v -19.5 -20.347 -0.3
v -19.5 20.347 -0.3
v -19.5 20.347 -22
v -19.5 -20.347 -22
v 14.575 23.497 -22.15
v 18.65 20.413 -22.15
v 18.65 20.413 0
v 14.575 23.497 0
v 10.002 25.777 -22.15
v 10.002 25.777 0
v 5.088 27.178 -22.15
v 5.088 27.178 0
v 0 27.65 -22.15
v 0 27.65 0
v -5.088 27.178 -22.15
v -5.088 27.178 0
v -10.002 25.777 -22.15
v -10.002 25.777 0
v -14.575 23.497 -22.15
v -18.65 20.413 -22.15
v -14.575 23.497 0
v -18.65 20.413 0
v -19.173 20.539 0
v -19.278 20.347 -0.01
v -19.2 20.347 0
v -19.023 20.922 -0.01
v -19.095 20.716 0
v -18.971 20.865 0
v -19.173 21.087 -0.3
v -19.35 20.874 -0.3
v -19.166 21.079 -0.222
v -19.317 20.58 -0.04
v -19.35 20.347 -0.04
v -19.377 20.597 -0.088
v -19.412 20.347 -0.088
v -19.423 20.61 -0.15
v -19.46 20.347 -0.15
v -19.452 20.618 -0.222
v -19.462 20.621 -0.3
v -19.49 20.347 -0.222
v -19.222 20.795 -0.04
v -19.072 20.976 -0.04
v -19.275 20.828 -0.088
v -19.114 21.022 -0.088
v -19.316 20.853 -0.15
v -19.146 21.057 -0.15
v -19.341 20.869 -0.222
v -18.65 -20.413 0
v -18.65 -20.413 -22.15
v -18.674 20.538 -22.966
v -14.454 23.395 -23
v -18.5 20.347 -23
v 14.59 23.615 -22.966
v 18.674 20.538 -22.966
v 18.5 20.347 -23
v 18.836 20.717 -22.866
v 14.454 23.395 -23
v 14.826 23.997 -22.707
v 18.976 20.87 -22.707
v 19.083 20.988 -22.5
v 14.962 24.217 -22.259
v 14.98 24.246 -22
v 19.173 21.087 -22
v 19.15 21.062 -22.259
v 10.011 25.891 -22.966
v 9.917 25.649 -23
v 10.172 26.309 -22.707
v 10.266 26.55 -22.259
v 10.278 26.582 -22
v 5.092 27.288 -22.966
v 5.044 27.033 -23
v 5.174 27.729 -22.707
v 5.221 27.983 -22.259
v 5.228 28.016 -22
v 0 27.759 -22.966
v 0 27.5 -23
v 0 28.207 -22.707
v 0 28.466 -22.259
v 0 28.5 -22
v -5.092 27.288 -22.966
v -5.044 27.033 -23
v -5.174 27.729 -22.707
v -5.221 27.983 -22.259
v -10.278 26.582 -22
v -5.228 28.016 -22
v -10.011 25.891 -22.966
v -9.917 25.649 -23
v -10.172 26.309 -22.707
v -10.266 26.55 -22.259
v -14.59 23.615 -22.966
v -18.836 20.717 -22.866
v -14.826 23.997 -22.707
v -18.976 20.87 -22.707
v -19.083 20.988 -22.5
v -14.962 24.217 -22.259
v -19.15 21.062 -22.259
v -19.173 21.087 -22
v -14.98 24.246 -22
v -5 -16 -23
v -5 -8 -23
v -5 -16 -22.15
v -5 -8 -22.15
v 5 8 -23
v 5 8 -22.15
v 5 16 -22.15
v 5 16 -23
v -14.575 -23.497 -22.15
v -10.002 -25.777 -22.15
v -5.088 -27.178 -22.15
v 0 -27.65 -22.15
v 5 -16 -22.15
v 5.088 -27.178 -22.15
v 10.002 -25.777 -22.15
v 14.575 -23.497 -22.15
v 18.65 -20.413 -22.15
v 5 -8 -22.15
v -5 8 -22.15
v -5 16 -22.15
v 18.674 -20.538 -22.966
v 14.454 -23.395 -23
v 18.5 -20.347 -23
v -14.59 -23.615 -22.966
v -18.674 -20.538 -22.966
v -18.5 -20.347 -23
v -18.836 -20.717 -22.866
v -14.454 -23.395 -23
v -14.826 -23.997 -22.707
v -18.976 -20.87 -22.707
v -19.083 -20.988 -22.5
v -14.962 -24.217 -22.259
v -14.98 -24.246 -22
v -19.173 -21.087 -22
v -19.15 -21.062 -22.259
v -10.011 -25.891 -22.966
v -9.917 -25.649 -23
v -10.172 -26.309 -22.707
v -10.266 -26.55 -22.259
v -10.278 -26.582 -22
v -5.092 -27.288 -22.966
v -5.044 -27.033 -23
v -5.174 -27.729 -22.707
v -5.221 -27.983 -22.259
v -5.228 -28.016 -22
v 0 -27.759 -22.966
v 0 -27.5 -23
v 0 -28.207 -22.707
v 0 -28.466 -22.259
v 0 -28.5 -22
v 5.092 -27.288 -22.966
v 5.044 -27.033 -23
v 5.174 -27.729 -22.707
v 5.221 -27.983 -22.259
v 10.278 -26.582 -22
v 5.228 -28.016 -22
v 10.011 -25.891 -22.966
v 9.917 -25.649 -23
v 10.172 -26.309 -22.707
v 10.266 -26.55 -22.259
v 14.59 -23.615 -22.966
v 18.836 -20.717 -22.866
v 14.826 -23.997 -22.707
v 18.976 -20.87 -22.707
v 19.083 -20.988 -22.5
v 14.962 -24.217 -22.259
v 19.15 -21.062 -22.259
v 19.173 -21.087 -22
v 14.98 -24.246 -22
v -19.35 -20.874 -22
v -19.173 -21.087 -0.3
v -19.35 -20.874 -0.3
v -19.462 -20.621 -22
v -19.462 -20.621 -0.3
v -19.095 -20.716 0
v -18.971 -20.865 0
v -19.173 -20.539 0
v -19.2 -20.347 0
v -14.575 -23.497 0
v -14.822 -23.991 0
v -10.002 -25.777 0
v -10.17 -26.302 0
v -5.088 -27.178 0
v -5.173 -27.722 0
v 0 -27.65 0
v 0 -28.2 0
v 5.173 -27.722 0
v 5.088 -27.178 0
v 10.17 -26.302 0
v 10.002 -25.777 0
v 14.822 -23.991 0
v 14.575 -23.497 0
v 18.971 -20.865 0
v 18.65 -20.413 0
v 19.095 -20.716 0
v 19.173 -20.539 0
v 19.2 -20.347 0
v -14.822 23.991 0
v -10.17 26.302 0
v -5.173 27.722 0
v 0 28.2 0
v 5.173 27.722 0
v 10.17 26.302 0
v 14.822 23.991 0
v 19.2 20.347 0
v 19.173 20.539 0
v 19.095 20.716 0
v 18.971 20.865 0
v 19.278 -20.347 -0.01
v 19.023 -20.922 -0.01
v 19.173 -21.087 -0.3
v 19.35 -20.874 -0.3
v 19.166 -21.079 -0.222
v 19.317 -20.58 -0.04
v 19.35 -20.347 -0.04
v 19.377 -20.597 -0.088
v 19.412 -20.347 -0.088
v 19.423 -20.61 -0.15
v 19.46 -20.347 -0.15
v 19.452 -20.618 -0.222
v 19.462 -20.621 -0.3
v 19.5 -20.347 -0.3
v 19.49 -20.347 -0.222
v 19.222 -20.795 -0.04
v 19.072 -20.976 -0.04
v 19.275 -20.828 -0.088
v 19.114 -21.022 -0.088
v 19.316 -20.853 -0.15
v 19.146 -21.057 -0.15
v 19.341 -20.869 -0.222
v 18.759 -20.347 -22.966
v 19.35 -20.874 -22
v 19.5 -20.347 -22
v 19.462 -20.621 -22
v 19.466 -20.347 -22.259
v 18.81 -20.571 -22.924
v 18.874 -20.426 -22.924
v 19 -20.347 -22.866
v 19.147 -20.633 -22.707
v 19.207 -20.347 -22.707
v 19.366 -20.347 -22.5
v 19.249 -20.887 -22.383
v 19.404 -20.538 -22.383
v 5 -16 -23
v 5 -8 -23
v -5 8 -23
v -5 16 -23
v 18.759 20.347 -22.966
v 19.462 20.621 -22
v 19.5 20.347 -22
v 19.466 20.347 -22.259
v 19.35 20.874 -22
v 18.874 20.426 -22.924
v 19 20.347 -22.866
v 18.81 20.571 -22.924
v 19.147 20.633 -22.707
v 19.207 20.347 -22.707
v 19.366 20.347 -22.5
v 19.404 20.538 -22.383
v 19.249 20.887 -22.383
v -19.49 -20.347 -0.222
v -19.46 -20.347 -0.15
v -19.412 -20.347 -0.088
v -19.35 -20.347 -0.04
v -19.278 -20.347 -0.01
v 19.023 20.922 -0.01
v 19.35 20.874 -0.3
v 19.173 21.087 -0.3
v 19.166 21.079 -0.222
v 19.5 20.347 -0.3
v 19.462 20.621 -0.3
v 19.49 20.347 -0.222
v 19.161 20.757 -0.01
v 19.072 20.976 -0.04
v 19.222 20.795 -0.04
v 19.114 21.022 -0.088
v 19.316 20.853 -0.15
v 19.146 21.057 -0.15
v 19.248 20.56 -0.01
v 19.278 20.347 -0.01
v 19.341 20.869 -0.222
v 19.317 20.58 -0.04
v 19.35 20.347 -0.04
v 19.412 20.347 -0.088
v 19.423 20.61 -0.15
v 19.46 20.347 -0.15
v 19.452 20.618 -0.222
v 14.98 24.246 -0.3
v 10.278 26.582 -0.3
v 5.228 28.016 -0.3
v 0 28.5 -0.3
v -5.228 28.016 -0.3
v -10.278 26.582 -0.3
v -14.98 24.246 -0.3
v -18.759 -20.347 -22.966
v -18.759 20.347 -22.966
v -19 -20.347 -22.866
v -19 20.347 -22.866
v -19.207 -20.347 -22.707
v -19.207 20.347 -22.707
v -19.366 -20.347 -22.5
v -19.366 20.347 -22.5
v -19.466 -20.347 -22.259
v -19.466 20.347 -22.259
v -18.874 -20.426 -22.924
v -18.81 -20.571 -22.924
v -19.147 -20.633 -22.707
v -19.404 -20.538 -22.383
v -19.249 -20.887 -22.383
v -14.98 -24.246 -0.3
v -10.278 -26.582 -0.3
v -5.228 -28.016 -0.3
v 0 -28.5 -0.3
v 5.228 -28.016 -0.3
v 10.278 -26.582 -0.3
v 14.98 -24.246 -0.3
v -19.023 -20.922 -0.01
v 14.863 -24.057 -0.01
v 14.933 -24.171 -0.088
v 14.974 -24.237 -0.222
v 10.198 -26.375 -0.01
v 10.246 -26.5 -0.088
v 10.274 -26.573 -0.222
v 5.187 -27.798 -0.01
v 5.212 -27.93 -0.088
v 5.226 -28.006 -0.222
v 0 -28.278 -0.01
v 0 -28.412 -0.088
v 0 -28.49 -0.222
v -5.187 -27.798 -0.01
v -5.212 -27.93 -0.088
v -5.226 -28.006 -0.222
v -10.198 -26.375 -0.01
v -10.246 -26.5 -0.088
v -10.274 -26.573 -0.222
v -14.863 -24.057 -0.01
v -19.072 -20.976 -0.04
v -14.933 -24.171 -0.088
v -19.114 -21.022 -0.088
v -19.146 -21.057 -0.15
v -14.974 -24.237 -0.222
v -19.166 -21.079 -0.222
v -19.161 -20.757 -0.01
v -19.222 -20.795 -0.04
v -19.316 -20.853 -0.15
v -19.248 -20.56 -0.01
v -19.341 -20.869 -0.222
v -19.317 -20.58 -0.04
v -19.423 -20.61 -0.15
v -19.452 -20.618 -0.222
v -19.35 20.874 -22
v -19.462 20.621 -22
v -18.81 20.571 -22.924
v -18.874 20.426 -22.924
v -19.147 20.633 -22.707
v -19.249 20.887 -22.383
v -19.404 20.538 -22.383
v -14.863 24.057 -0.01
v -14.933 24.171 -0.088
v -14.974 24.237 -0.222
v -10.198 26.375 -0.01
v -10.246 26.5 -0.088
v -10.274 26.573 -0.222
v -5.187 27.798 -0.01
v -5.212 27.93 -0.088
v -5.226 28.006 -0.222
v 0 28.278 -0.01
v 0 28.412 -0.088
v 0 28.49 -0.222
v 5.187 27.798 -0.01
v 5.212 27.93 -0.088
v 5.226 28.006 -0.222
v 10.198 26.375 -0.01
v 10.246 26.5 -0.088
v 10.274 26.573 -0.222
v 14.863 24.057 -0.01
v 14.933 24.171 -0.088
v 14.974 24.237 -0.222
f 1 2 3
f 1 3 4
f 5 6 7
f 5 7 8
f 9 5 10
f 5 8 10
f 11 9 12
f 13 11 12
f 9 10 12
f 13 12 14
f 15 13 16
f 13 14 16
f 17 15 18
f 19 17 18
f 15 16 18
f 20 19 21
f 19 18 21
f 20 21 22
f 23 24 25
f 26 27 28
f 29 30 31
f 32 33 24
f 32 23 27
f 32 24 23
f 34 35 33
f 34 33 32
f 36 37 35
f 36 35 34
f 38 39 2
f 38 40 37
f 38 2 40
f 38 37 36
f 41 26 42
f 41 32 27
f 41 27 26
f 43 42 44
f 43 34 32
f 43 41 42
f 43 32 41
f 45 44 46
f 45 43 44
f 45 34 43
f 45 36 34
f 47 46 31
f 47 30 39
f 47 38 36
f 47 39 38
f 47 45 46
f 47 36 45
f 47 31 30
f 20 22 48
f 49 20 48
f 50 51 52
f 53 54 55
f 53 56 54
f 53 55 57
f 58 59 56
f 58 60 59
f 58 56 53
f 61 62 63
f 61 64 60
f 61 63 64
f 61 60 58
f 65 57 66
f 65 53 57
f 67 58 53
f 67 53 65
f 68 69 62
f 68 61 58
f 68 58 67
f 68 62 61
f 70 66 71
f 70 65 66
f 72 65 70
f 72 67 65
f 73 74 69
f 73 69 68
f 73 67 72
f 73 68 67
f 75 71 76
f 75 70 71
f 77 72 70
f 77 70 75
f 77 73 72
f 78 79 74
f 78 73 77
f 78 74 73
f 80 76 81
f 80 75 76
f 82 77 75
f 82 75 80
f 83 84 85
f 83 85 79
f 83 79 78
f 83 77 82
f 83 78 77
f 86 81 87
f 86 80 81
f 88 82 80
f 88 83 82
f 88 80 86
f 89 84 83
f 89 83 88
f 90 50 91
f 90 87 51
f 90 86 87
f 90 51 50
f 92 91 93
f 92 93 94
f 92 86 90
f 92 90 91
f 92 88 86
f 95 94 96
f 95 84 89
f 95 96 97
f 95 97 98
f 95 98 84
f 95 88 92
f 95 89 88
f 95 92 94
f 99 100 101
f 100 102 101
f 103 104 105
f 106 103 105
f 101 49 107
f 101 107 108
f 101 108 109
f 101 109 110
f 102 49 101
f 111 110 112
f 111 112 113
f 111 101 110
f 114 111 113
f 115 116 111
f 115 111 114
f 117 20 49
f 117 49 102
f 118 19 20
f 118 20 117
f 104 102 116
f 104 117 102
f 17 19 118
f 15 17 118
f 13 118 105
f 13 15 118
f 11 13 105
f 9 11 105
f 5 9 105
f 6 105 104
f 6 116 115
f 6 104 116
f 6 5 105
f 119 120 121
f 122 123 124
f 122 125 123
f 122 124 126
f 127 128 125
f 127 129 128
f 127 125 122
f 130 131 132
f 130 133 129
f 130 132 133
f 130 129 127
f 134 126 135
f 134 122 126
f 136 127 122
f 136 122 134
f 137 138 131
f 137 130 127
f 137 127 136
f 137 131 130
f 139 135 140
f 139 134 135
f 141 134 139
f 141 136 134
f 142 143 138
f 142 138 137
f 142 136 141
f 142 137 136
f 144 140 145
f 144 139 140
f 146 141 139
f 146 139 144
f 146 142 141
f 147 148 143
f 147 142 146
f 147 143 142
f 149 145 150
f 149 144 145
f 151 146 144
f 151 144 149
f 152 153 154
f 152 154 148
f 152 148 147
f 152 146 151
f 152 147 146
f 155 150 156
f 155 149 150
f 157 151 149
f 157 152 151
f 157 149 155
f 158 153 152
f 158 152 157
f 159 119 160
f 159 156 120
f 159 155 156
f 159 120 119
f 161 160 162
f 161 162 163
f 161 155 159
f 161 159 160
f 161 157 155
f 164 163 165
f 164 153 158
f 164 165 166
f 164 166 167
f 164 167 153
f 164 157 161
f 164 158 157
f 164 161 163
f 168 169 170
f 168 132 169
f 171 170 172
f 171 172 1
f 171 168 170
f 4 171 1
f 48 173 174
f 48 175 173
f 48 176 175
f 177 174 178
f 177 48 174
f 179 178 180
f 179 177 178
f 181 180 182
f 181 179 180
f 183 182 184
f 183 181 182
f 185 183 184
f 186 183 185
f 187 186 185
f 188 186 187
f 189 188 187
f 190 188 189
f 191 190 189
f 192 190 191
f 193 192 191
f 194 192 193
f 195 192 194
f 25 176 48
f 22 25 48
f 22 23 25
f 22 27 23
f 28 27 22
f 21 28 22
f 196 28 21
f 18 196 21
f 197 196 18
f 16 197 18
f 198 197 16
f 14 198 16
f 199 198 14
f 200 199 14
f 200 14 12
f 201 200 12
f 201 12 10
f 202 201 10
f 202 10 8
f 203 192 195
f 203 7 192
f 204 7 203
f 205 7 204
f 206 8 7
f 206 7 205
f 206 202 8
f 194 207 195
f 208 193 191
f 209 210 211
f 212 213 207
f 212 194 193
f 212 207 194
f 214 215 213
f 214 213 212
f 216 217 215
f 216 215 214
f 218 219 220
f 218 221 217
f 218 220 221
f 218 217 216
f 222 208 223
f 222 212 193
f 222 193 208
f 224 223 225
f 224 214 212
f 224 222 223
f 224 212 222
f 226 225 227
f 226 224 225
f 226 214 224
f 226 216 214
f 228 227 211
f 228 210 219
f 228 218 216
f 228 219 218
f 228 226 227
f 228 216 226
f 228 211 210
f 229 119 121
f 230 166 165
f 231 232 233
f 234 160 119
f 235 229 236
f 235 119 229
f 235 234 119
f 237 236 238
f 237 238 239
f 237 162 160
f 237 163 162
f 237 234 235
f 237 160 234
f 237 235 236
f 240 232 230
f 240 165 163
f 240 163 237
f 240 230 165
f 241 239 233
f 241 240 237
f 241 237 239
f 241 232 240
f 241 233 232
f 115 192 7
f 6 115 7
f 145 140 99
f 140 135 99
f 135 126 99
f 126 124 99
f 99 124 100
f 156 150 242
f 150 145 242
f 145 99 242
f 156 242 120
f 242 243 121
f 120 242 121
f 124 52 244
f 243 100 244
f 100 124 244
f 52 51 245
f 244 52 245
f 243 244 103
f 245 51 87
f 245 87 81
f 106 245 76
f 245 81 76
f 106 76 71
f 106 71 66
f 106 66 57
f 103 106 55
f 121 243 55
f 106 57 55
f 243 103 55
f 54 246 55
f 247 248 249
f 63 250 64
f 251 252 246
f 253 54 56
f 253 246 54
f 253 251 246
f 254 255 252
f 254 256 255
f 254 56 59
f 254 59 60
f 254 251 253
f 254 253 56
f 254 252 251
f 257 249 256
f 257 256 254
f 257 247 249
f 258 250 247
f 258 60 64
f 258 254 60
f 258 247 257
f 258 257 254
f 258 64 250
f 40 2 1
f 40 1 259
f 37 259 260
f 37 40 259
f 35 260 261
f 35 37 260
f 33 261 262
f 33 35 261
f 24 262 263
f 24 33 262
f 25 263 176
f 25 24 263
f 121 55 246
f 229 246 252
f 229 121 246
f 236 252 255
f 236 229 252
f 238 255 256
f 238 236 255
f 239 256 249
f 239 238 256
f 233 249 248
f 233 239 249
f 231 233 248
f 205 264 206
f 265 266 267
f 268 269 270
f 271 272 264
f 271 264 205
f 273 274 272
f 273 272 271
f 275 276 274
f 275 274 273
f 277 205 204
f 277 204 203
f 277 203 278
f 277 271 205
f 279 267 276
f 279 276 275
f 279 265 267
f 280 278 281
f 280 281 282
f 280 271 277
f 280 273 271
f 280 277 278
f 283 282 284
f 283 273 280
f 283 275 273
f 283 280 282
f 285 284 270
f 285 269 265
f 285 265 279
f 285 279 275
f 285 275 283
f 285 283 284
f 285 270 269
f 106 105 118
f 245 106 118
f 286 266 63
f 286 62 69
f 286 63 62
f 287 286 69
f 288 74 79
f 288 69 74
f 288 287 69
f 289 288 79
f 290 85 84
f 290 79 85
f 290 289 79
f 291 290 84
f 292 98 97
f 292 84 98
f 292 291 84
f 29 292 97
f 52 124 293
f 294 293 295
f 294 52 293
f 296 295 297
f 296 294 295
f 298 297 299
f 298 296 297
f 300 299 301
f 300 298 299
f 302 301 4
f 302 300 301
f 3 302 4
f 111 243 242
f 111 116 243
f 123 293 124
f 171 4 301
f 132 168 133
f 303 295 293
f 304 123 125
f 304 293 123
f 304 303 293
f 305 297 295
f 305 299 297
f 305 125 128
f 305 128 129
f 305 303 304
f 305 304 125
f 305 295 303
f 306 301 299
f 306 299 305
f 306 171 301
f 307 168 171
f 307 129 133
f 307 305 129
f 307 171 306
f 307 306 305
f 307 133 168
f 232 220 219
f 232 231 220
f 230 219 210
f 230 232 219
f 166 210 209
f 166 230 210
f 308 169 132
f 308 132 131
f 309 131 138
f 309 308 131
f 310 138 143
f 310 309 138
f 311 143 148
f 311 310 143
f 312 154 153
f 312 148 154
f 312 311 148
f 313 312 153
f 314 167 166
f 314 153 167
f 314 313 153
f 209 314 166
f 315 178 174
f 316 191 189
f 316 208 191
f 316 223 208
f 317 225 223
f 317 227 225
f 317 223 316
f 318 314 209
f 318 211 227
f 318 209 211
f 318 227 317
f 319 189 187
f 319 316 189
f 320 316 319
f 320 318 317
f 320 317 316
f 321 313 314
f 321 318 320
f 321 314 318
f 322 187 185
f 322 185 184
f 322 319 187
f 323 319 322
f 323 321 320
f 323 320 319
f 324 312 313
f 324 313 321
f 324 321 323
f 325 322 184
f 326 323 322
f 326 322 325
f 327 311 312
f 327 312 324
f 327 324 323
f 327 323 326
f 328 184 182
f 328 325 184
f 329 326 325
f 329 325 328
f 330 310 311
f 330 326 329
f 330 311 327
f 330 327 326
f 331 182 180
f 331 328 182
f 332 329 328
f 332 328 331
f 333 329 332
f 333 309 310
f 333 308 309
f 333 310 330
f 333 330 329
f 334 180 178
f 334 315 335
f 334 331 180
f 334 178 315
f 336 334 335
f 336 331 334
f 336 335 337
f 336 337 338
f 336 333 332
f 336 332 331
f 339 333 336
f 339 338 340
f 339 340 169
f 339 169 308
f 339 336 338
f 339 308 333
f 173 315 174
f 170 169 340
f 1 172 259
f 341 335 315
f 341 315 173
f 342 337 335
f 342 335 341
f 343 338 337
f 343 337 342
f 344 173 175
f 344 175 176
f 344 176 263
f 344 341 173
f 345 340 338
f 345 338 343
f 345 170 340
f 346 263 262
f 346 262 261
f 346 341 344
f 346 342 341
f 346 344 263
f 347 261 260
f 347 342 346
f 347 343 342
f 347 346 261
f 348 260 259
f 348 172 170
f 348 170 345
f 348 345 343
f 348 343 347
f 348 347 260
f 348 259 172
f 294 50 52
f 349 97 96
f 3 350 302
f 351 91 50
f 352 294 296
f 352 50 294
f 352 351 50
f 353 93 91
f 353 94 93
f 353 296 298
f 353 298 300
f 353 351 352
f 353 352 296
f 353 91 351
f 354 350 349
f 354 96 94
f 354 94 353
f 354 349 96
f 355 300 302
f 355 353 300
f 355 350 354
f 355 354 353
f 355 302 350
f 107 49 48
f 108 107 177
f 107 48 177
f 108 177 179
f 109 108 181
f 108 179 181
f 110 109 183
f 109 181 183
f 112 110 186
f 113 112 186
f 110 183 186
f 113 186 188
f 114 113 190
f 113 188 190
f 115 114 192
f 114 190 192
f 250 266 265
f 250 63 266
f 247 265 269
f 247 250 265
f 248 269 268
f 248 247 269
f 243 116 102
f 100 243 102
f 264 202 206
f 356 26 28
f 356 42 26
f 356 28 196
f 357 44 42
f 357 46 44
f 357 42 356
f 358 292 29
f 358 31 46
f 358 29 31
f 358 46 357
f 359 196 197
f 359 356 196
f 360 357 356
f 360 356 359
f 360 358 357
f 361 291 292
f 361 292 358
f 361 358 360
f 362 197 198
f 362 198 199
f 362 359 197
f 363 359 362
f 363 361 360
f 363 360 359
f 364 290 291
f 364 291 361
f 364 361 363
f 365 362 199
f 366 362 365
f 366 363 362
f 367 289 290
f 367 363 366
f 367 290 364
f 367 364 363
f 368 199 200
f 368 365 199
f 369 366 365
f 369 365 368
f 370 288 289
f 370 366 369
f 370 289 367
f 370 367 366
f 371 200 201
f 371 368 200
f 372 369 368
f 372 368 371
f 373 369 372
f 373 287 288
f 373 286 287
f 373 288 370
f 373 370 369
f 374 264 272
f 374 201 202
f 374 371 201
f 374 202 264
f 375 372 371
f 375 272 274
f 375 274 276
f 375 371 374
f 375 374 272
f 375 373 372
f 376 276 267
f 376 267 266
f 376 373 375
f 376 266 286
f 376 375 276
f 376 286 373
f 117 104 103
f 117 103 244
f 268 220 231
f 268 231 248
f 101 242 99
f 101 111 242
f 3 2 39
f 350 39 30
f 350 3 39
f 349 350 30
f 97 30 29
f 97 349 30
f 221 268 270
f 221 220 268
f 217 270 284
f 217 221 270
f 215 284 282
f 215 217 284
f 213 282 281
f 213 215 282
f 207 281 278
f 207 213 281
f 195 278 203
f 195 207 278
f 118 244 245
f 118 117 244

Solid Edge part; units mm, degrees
sketch "Sketch1" plane through (0, 0, 0) normal (0, 0, 1) x (1, 0, 0)
  line L0 (-19.5, 20.7846) -> (-19.5, -20.7846)
  arc A0 (19.5, -20.7846) -> (-19.5, -20.7846) centre (0, 0) cw
  line L1 (19.5, -20.7846) -> (19.5, 20.7846)
  arc A1 (-19.5, 20.7846) -> (19.5, 20.7846) centre (0, 0) cw
extrude "Protrusion1" add sketch "Sketch1" against normal blind 23
shell "Thinwall1" thickness 0.85 removed faces 1 at (-13.39, -18.43, 0)
sketch "Sketch2" plane through (0, 0, -22.15) normal (0, 0, 1) x (0, 1, 0)
  line L0 (-16, -5) -> (-16, 5)
  line L1 (-8, 5) -> (-16, 5)
  line L2 (-8, -5) -> (-8, 5)
  line L3 (-8, -5) -> (-16, -5)
  line L4 (8, -5) -> (16, -5)
  line L5 (16, -5) -> (16, 5)
  line L6 (8, 5) -> (16, 5)
  line L7 (8, -5) -> (8, 5)
extrude "Cutout1" cut sketch "Sketch2" against normal blind 41.275
fillet "Round1" radius 1 4 edges at (19.5, -20.7846, -11.5) (19.5, 20.7846, -11.5) (-19.5, 20.7846, -11.5) (-19.5, -20.7846, -11.5)
fillet "Round2" radius 0.3 8 edges at (0, -28.5, 0) (19.4145, -20.7515, 0) (-19.4145, -20.7515, 0) (19.5, 0, 0) (-19.5, 0, 0) (19.4145, 20.7515, 0) (-19.4145, 20.7515, 0) (0, 28.5, 0)
fillet "Round3" radius 1 8 edges at (0, -28.5, -23) (19.4145, -20.7515, -23) (-19.4145, -20.7515, -23) (19.5, 0, -23) (-19.5, 0, -23) (19.4145, 20.7515, -23) (-19.4145, 20.7515, -23) (0, 28.5, -23)
properties material "boot"
